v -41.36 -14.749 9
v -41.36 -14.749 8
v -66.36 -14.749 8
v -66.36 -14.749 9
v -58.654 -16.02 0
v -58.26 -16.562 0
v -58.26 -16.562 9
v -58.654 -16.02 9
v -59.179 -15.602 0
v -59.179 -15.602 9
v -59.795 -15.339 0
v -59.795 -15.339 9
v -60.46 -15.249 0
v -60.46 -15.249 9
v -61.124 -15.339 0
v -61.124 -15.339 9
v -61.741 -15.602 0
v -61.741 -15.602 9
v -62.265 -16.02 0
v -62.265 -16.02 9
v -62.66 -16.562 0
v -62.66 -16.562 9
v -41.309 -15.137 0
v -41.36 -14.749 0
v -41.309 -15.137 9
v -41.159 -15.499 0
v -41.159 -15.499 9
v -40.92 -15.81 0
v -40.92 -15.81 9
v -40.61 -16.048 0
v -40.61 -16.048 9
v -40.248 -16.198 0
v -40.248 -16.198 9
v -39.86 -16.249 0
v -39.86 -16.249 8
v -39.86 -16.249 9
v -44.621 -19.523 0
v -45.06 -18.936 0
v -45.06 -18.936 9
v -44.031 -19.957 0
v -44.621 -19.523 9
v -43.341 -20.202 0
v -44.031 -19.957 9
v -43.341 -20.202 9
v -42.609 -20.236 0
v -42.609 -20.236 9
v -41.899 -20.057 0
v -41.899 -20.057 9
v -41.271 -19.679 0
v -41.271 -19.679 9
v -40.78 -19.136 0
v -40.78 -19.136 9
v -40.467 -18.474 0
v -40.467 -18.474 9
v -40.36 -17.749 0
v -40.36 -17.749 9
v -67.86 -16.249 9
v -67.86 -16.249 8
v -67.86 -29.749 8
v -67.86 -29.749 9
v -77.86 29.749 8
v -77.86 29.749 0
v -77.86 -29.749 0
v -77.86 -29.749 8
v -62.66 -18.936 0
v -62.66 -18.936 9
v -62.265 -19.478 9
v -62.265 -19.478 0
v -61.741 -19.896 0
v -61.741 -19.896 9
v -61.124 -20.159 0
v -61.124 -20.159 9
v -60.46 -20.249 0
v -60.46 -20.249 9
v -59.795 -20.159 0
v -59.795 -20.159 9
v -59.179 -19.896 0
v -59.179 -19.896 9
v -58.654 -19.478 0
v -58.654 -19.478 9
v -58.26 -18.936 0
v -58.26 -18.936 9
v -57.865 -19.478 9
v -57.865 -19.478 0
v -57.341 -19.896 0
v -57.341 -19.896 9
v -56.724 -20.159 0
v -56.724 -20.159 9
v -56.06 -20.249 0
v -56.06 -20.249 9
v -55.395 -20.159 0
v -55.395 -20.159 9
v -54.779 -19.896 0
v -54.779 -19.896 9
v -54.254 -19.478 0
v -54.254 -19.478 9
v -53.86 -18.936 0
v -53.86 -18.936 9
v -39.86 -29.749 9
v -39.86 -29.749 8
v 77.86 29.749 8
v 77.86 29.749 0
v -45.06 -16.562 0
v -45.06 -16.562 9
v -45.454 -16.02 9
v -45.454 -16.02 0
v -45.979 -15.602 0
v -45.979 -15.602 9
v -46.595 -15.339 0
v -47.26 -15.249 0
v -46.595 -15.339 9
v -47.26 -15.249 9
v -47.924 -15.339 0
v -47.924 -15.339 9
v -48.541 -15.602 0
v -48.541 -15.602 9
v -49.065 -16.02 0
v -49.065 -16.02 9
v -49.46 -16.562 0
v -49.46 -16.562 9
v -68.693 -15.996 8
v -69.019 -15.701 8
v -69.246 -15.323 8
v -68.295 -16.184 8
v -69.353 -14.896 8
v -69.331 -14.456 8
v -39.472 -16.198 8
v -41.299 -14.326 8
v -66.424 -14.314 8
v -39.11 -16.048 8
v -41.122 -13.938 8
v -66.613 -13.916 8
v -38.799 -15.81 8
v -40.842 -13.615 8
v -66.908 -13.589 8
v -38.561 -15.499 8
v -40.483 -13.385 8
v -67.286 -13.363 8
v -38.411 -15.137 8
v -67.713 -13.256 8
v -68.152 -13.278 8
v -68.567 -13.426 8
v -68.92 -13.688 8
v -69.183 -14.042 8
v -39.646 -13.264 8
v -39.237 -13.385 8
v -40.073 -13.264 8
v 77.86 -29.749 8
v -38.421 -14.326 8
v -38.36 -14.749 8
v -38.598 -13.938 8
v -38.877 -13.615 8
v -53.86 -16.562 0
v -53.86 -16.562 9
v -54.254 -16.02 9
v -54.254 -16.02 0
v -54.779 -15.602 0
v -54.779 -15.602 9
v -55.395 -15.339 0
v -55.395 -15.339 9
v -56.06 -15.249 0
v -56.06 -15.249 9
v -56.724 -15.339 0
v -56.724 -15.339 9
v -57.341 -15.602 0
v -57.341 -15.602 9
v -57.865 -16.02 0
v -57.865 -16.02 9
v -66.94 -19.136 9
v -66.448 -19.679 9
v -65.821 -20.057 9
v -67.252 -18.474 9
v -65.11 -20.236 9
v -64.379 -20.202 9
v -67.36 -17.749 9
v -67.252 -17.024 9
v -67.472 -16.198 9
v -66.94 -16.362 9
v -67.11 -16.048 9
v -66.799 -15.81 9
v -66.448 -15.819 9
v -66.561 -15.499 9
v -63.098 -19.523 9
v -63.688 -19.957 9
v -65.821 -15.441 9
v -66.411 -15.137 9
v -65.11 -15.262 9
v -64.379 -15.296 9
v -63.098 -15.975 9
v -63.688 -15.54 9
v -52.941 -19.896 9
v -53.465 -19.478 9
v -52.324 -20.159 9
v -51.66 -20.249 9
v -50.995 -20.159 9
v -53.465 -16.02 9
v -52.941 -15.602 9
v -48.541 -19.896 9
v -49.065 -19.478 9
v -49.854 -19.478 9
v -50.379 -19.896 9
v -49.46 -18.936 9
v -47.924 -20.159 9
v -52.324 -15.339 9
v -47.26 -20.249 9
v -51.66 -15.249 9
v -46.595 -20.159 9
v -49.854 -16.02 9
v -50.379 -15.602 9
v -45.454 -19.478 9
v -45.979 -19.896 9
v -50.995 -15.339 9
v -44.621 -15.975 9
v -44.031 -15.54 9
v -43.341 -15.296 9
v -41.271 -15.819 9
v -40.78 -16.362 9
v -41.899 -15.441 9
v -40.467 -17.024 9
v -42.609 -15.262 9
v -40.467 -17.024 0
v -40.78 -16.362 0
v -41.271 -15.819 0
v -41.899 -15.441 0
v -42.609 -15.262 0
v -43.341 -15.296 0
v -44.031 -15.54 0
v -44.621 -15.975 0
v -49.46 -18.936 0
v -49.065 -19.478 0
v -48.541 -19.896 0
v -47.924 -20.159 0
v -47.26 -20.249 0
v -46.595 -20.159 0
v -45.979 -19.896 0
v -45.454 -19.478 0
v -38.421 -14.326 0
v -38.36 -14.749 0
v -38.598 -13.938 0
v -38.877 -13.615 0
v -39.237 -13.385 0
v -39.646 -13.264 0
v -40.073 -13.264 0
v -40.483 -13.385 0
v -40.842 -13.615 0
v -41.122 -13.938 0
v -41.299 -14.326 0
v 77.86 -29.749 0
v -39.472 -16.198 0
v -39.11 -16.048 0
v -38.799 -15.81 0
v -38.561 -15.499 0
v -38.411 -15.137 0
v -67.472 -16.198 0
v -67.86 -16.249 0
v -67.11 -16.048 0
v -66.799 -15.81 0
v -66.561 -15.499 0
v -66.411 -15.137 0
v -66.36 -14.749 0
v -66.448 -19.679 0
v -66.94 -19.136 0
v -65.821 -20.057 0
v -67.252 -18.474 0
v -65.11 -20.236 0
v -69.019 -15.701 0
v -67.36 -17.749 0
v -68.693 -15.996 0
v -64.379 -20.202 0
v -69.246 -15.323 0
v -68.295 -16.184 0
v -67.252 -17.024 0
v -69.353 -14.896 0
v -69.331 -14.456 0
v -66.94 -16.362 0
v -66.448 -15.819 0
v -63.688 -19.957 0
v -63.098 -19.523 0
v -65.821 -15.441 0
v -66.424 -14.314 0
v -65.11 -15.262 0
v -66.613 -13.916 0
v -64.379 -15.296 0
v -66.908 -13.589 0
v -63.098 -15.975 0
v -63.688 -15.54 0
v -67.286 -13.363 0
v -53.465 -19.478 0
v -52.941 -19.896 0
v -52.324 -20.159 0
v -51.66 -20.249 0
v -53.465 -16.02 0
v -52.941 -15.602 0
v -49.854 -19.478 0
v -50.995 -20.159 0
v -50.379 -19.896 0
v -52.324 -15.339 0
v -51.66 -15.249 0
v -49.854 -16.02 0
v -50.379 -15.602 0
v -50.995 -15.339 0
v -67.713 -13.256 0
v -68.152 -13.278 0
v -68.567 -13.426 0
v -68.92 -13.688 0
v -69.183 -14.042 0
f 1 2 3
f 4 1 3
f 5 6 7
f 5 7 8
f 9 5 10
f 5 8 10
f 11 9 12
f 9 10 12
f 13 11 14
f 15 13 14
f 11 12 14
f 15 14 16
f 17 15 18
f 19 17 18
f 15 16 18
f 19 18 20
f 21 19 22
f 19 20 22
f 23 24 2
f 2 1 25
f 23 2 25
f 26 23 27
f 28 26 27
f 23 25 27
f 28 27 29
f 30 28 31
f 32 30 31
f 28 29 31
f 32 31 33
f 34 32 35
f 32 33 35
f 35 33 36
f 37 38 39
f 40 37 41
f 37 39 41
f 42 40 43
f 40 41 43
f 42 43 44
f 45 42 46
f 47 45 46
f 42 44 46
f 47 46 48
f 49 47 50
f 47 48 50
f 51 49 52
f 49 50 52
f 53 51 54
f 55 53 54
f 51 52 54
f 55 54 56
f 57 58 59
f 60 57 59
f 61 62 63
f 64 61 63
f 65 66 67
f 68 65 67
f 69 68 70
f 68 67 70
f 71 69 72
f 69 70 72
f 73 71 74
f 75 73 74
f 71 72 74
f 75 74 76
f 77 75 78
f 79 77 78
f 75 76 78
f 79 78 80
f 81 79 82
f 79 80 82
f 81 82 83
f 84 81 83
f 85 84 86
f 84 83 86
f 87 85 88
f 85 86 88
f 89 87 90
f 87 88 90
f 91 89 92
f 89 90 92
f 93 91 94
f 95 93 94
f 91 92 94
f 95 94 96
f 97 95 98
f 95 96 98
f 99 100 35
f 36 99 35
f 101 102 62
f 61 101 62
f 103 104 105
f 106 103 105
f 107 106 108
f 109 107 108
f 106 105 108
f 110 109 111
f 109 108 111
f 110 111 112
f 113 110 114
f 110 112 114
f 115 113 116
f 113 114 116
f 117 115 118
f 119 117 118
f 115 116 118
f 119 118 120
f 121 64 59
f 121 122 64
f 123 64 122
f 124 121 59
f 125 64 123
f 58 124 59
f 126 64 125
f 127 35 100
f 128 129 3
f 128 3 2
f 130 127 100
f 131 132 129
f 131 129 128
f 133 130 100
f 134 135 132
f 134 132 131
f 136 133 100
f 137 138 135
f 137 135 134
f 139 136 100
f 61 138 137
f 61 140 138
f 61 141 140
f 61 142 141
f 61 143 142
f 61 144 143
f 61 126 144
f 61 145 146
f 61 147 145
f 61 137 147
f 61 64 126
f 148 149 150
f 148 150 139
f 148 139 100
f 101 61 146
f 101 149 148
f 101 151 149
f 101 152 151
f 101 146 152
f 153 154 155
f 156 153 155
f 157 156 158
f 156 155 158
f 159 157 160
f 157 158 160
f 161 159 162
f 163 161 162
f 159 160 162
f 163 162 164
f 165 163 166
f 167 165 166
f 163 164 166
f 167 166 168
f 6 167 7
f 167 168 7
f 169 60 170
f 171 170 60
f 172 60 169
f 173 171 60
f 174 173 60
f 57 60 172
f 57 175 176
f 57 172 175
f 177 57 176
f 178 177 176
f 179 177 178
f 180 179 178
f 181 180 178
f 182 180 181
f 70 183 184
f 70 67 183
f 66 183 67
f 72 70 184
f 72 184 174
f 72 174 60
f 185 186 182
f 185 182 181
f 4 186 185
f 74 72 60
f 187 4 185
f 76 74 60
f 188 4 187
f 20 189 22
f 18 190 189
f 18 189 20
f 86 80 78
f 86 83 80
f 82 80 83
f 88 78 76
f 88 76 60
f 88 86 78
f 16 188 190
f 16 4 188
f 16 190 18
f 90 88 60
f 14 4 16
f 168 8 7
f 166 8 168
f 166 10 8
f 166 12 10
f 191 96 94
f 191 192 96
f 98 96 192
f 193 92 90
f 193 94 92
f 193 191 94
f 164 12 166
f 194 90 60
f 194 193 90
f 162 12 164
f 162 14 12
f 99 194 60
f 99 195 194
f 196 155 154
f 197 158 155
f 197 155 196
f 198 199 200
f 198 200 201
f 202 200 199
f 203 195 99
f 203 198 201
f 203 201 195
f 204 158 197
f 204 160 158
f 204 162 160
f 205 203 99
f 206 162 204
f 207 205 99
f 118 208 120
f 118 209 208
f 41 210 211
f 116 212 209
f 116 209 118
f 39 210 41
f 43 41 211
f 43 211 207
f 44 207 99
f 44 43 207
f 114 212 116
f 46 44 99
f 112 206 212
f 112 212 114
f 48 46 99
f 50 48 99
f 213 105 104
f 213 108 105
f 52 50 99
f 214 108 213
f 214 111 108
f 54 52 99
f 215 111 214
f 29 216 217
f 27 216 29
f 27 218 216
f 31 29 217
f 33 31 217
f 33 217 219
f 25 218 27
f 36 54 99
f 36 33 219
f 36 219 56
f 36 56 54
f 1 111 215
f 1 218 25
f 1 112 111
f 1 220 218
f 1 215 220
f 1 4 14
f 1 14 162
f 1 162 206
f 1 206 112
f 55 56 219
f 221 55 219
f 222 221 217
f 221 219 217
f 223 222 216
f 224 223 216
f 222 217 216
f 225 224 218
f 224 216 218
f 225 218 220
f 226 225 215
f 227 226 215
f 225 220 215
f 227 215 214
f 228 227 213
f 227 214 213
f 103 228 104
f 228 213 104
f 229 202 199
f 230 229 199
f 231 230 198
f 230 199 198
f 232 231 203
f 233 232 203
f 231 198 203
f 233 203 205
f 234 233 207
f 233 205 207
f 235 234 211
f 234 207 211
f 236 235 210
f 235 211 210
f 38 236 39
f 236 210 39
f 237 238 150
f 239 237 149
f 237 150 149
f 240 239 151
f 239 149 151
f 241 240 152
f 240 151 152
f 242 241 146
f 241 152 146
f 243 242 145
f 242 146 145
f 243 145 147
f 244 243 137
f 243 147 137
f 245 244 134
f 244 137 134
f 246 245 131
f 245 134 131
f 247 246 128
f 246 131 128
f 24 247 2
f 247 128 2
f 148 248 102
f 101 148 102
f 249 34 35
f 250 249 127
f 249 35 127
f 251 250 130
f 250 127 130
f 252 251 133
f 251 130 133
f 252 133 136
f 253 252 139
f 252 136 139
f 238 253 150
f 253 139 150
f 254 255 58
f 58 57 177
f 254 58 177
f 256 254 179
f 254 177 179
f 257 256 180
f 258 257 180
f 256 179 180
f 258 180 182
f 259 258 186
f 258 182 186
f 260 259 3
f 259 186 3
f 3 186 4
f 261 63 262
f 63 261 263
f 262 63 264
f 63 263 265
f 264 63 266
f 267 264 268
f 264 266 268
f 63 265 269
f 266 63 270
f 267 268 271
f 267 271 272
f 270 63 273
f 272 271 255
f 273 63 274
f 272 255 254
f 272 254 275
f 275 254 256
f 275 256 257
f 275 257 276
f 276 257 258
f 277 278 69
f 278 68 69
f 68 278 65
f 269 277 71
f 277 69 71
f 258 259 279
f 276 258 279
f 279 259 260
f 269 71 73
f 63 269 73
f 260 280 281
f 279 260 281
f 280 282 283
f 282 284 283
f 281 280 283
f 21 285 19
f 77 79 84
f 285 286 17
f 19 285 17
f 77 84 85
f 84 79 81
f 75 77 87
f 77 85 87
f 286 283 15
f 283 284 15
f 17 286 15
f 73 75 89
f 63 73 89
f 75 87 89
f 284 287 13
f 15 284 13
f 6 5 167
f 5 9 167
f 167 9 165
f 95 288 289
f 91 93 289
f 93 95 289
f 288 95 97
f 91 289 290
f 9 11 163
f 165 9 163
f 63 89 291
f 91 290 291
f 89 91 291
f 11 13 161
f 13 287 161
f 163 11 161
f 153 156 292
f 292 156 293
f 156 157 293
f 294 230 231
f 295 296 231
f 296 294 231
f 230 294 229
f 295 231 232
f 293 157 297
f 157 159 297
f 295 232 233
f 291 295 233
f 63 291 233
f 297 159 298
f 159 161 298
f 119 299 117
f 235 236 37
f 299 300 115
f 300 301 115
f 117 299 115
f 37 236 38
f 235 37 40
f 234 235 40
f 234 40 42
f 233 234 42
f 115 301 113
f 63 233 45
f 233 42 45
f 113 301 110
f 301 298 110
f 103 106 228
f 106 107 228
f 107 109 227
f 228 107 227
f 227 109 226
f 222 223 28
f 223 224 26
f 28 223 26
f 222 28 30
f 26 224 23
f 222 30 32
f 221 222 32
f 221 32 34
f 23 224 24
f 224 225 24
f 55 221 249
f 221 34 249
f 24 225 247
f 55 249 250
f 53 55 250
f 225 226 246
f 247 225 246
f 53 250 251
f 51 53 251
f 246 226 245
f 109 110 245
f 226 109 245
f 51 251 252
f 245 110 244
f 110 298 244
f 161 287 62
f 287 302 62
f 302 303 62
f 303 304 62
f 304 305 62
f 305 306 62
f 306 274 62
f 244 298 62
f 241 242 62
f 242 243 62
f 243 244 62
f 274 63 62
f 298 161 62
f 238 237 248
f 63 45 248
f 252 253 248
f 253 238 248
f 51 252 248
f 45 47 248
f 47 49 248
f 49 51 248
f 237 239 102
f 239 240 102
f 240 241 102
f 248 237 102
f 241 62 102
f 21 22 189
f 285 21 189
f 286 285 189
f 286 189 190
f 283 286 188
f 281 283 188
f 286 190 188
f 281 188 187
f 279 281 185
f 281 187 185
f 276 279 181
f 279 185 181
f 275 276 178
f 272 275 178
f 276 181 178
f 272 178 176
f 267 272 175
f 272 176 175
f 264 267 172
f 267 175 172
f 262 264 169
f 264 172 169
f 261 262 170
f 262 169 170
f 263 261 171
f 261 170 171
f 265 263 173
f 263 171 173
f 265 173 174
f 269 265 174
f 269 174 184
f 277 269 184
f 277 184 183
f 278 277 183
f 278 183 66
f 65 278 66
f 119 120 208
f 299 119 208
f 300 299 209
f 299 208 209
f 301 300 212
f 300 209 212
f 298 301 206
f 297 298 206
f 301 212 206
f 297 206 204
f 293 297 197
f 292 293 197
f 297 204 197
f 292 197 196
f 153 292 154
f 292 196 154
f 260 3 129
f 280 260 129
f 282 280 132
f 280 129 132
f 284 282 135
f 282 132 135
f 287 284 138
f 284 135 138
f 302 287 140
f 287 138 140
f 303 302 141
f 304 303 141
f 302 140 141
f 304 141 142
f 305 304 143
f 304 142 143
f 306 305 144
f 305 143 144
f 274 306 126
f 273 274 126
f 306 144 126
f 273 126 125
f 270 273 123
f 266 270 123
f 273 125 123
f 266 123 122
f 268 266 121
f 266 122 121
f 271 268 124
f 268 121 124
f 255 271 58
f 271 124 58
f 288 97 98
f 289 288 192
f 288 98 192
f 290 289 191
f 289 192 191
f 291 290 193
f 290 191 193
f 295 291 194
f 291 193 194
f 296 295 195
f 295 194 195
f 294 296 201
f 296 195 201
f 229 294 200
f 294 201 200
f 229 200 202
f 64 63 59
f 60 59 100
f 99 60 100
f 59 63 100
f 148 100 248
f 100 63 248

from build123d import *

# Parameters (mm, degrees)
F1_DEPTH = 8
F3_DEPTH = 1
F5_DEPTH = 25


with BuildPart() as f1:
    # F0 (on Top) → F1 (new body)
    with BuildSketch(Plane.XY):
        with BuildLine():
            Line((77.8597715207, -29.7489808303), (77.8597715207, 29.7489808303))
            Line((77.8597715207, 29.7489808303), (-77.8597715207, 29.7489808303))
            Line((-77.8597715207, 29.7489808303), (-77.8597715207, -29.7489808303))
            Line((-77.8597715207, -29.7489808303), (-67.8597715207, -29.7489808303))
            Line((-67.8597715207, -29.7489808303), (-67.8597715207, -16.2489808303))
            ThreePointArc((-67.8597715207, -16.2489808303), (-68.9204316925, -13.6883206586), (-66.3597715207, -14.7489808303))
            Line((-66.3597715207, -14.7489808303), (-41.3597715207, -14.7489808303))
            ThreePointArc((-41.3597715207, -14.7489808303), (-38.7991113489, -13.6883206586), (-39.8597715207, -16.2489808303))
            Line((-39.8597715207, -16.2489808303), (-39.8597715207, -29.7489808303))
            Line((-39.8597715207, -29.7489808303), (77.8597715207, -29.7489808303))
        make_face()
        with BuildLine():
            Line((-67.8597715207, -29.7489808303), (-39.8597715207, -29.7489808303))
            Line((-39.8597715207, -29.7489808303), (-39.8597715207, -16.2489808303))
            ThreePointArc((-39.8597715207, -16.2489808303), (-38.7991113489, -13.6883206586), (-41.3597715207, -14.7489808303))
            Line((-41.3597715207, -14.7489808303), (-66.3597715207, -14.7489808303))
            ThreePointArc((-66.3597715207, -14.7489808303), (-68.9204316925, -13.6883206586), (-67.8597715207, -16.2489808303))
            Line((-67.8597715207, -16.2489808303), (-67.8597715207, -29.7489808303))
        make_face()
    extrude(amount=F1_DEPTH)

    # F2 (on face) → F3 (join)
    with BuildSketch(Plane.XY.offset(8)):
        with BuildLine():
            Line((-67.8597715207, -16.2489808303), (-67.8597715207, -29.7489808303))
            Line((-67.8597715207, -29.7489808303), (-39.8597715207, -29.7489808303))
            Line((-39.8597715207, -29.7489808303), (-39.8597715207, -16.2489808303))
            ThreePointArc((-39.8597715207, -16.2489808303), (-38.7991113489, -13.6883206586), (-41.3597715207, -14.7489808303))
            Line((-41.3597715207, -14.7489808303), (-66.3597715207, -14.7489808303))
            ThreePointArc((-66.3597715207, -14.7489808303), (-68.9204316925, -13.6883206586), (-67.8597715207, -16.2489808303))
        make_face()
    extrude(amount=F3_DEPTH)

    # F4 (on face) → F5 (cut)
    with BuildSketch(Plane.XY.offset(9)):
        with BuildLine():
            ThreePointArc((-62.6597715207, -18.936415039), (-62.9597715207, -17.7489808303), (-62.6597715207, -16.5615466216))
            ThreePointArc((-62.6597715207, -16.5615466216), (-67.3597715207, -17.7489808303), (-62.6597715207, -18.936415039))
        make_face()
        with BuildLine():
            ThreePointArc((-62.6597715207, -16.5615466216), (-62.435931592, -17.1366083946), (-62.3597715207, -17.7489808303))
            ThreePointArc((-62.3597715207, -17.7489808303), (-62.435931592, -18.361353266), (-62.6597715207, -18.936415039))
            ThreePointArc((-62.6597715207, -18.936415039), (-60.4597715207, -20.2489808303), (-58.2597715207, -18.936415039))
            ThreePointArc((-58.2597715207, -18.936415039), (-58.5597715207, -17.7489808303), (-58.2597715207, -16.5615466216))
            ThreePointArc((-58.2597715207, -16.5615466216), (-60.4597715207, -15.2489808303), (-62.6597715207, -16.5615466216))
        make_face()
        with BuildLine():
            ThreePointArc((-53.8597715207, -16.5615466216), (-56.0597715207, -15.2489808303), (-58.2597715207, -16.5615466216))
            ThreePointArc((-58.2597715207, -16.5615466216), (-58.035931592, -17.1366083946), (-57.9597715207, -17.7489808303))
            ThreePointArc((-57.9597715207, -17.7489808303), (-58.035931592, -18.361353266), (-58.2597715207, -18.936415039))
            ThreePointArc((-58.2597715207, -18.936415039), (-56.0597715207, -20.2489808303), (-53.8597715207, -18.936415039))
            ThreePointArc((-53.8597715207, -18.936415039), (-54.1597715207, -17.7489808303), (-53.8597715207, -16.5615466216))
        make_face()
        with BuildLine():
            ThreePointArc((-49.4597715207, -16.5615466216), (-51.6597715207, -15.2489808303), (-53.8597715207, -16.5615466216))
            ThreePointArc((-53.8597715207, -16.5615466216), (-53.635931592, -17.1366083946), (-53.5597715207, -17.7489808303))
            ThreePointArc((-53.5597715207, -17.7489808303), (-53.635931592, -18.361353266), (-53.8597715207, -18.936415039))
            ThreePointArc((-53.8597715207, -18.936415039), (-51.6597715207, -20.2489808303), (-49.4597715207, -18.936415039))
            ThreePointArc((-49.4597715207, -18.936415039), (-49.7597715207, -17.7489808303), (-49.4597715207, -16.5615466216))
        make_face()
        with BuildLine():
            ThreePointArc((-45.0597715207, -16.5615466216), (-47.2597715207, -15.2489808303), (-49.4597715207, -16.5615466216))
            ThreePointArc((-49.4597715207, -16.5615466216), (-49.235931592, -17.1366083946), (-49.1597715207, -17.7489808303))
            ThreePointArc((-49.1597715207, -17.7489808303), (-49.235931592, -18.361353266), (-49.4597715207, -18.936415039))
            ThreePointArc((-49.4597715207, -18.936415039), (-47.2597715207, -20.2489808303), (-45.0597715207, -18.936415039))
            ThreePointArc((-45.0597715207, -18.936415039), (-45.3597715207, -17.7489808303), (-45.0597715207, -16.5615466216))
        make_face()
        with BuildLine():
            ThreePointArc((-40.3597715207, -17.7489808303), (-42.247399085, -15.3251409016), (-45.0597715207, -16.5615466216))
            ThreePointArc((-45.0597715207, -16.5615466216), (-44.835931592, -17.1366083946), (-44.7597715207, -17.7489808303))
            ThreePointArc((-44.7597715207, -17.7489808303), (-44.835931592, -18.361353266), (-45.0597715207, -18.936415039))
            ThreePointArc((-45.0597715207, -18.936415039), (-42.247399085, -20.1728207591), (-40.3597715207, -17.7489808303))
        make_face()
        with BuildLine():
            ThreePointArc((-57.9597715207, -17.7489808303), (-58.035931592, -17.1366083946), (-58.2597715207, -16.5615466216))
            ThreePointArc((-58.2597715207, -16.5615466216), (-58.5597715207, -17.7489808303), (-58.2597715207, -18.936415039))
            ThreePointArc((-58.2597715207, -18.936415039), (-58.035931592, -18.361353266), (-57.9597715207, -17.7489808303))
        make_face()
        with BuildLine():
            ThreePointArc((-62.6597715207, -18.936415039), (-62.435931592, -18.361353266), (-62.3597715207, -17.7489808303))
            ThreePointArc((-62.3597715207, -17.7489808303), (-62.435931592, -17.1366083946), (-62.6597715207, -16.5615466216))
            ThreePointArc((-62.6597715207, -16.5615466216), (-62.9597715207, -17.7489808303), (-62.6597715207, -18.936415039))
        make_face()
        with BuildLine():
            ThreePointArc((-53.5597715207, -17.7489808303), (-53.635931592, -17.1366083946), (-53.8597715207, -16.5615466216))
            Line((-53.8597715207, -16.5615466216), (-53.8597715207, -18.936415039))
            ThreePointArc((-53.8597715207, -18.936415039), (-53.635931592, -18.361353266), (-53.5597715207, -17.7489808303))
        make_face()
        with BuildLine():
            ThreePointArc((-49.1597715207, -17.7489808303), (-49.235931592, -17.1366083946), (-49.4597715207, -16.5615466216))
            ThreePointArc((-49.4597715207, -16.5615466216), (-49.7597715207, -17.7489808303), (-49.4597715207, -18.936415039))
            ThreePointArc((-49.4597715207, -18.936415039), (-49.235931592, -18.361353266), (-49.1597715207, -17.7489808303))
        make_face()
        with BuildLine():
            ThreePointArc((-44.7597715207, -17.7489808303), (-44.835931592, -17.1366083946), (-45.0597715207, -16.5615466216))
            ThreePointArc((-45.0597715207, -16.5615466216), (-45.3597715207, -17.7489808303), (-45.0597715207, -18.936415039))
            ThreePointArc((-45.0597715207, -18.936415039), (-44.835931592, -18.361353266), (-44.7597715207, -17.7489808303))
        make_face()
        with BuildLine():
            Line((-53.8597715207, -18.936415039), (-53.8597715207, -16.5615466216))
            ThreePointArc((-53.8597715207, -16.5615466216), (-54.1597715207, -17.7489808303), (-53.8597715207, -18.936415039))
        make_face()
        with BuildLine():
            ThreePointArc((-67.8597715207, -16.2489808303), (-66.7991113489, -15.8096410021), (-66.3597715207, -14.7489808303))
            ThreePointArc((-66.3597715207, -14.7489808303), (-68.9204316925, -13.6883206586), (-67.8597715207, -16.2489808303))
        make_face()
        with BuildLine():
            ThreePointArc((-38.3597715207, -14.7489808303), (-39.8597715207, -13.2489808303), (-41.3597715207, -14.7489808303))
            ThreePointArc((-41.3597715207, -14.7489808303), (-40.9204316925, -15.8096410021), (-39.8597715207, -16.2489808303))
            ThreePointArc((-39.8597715207, -16.2489808303), (-38.7991113489, -15.8096410021), (-38.3597715207, -14.7489808303))
        make_face()
    extrude(amount=-F5_DEPTH, mode=Mode.SUBTRACT)


solid = f1.part
